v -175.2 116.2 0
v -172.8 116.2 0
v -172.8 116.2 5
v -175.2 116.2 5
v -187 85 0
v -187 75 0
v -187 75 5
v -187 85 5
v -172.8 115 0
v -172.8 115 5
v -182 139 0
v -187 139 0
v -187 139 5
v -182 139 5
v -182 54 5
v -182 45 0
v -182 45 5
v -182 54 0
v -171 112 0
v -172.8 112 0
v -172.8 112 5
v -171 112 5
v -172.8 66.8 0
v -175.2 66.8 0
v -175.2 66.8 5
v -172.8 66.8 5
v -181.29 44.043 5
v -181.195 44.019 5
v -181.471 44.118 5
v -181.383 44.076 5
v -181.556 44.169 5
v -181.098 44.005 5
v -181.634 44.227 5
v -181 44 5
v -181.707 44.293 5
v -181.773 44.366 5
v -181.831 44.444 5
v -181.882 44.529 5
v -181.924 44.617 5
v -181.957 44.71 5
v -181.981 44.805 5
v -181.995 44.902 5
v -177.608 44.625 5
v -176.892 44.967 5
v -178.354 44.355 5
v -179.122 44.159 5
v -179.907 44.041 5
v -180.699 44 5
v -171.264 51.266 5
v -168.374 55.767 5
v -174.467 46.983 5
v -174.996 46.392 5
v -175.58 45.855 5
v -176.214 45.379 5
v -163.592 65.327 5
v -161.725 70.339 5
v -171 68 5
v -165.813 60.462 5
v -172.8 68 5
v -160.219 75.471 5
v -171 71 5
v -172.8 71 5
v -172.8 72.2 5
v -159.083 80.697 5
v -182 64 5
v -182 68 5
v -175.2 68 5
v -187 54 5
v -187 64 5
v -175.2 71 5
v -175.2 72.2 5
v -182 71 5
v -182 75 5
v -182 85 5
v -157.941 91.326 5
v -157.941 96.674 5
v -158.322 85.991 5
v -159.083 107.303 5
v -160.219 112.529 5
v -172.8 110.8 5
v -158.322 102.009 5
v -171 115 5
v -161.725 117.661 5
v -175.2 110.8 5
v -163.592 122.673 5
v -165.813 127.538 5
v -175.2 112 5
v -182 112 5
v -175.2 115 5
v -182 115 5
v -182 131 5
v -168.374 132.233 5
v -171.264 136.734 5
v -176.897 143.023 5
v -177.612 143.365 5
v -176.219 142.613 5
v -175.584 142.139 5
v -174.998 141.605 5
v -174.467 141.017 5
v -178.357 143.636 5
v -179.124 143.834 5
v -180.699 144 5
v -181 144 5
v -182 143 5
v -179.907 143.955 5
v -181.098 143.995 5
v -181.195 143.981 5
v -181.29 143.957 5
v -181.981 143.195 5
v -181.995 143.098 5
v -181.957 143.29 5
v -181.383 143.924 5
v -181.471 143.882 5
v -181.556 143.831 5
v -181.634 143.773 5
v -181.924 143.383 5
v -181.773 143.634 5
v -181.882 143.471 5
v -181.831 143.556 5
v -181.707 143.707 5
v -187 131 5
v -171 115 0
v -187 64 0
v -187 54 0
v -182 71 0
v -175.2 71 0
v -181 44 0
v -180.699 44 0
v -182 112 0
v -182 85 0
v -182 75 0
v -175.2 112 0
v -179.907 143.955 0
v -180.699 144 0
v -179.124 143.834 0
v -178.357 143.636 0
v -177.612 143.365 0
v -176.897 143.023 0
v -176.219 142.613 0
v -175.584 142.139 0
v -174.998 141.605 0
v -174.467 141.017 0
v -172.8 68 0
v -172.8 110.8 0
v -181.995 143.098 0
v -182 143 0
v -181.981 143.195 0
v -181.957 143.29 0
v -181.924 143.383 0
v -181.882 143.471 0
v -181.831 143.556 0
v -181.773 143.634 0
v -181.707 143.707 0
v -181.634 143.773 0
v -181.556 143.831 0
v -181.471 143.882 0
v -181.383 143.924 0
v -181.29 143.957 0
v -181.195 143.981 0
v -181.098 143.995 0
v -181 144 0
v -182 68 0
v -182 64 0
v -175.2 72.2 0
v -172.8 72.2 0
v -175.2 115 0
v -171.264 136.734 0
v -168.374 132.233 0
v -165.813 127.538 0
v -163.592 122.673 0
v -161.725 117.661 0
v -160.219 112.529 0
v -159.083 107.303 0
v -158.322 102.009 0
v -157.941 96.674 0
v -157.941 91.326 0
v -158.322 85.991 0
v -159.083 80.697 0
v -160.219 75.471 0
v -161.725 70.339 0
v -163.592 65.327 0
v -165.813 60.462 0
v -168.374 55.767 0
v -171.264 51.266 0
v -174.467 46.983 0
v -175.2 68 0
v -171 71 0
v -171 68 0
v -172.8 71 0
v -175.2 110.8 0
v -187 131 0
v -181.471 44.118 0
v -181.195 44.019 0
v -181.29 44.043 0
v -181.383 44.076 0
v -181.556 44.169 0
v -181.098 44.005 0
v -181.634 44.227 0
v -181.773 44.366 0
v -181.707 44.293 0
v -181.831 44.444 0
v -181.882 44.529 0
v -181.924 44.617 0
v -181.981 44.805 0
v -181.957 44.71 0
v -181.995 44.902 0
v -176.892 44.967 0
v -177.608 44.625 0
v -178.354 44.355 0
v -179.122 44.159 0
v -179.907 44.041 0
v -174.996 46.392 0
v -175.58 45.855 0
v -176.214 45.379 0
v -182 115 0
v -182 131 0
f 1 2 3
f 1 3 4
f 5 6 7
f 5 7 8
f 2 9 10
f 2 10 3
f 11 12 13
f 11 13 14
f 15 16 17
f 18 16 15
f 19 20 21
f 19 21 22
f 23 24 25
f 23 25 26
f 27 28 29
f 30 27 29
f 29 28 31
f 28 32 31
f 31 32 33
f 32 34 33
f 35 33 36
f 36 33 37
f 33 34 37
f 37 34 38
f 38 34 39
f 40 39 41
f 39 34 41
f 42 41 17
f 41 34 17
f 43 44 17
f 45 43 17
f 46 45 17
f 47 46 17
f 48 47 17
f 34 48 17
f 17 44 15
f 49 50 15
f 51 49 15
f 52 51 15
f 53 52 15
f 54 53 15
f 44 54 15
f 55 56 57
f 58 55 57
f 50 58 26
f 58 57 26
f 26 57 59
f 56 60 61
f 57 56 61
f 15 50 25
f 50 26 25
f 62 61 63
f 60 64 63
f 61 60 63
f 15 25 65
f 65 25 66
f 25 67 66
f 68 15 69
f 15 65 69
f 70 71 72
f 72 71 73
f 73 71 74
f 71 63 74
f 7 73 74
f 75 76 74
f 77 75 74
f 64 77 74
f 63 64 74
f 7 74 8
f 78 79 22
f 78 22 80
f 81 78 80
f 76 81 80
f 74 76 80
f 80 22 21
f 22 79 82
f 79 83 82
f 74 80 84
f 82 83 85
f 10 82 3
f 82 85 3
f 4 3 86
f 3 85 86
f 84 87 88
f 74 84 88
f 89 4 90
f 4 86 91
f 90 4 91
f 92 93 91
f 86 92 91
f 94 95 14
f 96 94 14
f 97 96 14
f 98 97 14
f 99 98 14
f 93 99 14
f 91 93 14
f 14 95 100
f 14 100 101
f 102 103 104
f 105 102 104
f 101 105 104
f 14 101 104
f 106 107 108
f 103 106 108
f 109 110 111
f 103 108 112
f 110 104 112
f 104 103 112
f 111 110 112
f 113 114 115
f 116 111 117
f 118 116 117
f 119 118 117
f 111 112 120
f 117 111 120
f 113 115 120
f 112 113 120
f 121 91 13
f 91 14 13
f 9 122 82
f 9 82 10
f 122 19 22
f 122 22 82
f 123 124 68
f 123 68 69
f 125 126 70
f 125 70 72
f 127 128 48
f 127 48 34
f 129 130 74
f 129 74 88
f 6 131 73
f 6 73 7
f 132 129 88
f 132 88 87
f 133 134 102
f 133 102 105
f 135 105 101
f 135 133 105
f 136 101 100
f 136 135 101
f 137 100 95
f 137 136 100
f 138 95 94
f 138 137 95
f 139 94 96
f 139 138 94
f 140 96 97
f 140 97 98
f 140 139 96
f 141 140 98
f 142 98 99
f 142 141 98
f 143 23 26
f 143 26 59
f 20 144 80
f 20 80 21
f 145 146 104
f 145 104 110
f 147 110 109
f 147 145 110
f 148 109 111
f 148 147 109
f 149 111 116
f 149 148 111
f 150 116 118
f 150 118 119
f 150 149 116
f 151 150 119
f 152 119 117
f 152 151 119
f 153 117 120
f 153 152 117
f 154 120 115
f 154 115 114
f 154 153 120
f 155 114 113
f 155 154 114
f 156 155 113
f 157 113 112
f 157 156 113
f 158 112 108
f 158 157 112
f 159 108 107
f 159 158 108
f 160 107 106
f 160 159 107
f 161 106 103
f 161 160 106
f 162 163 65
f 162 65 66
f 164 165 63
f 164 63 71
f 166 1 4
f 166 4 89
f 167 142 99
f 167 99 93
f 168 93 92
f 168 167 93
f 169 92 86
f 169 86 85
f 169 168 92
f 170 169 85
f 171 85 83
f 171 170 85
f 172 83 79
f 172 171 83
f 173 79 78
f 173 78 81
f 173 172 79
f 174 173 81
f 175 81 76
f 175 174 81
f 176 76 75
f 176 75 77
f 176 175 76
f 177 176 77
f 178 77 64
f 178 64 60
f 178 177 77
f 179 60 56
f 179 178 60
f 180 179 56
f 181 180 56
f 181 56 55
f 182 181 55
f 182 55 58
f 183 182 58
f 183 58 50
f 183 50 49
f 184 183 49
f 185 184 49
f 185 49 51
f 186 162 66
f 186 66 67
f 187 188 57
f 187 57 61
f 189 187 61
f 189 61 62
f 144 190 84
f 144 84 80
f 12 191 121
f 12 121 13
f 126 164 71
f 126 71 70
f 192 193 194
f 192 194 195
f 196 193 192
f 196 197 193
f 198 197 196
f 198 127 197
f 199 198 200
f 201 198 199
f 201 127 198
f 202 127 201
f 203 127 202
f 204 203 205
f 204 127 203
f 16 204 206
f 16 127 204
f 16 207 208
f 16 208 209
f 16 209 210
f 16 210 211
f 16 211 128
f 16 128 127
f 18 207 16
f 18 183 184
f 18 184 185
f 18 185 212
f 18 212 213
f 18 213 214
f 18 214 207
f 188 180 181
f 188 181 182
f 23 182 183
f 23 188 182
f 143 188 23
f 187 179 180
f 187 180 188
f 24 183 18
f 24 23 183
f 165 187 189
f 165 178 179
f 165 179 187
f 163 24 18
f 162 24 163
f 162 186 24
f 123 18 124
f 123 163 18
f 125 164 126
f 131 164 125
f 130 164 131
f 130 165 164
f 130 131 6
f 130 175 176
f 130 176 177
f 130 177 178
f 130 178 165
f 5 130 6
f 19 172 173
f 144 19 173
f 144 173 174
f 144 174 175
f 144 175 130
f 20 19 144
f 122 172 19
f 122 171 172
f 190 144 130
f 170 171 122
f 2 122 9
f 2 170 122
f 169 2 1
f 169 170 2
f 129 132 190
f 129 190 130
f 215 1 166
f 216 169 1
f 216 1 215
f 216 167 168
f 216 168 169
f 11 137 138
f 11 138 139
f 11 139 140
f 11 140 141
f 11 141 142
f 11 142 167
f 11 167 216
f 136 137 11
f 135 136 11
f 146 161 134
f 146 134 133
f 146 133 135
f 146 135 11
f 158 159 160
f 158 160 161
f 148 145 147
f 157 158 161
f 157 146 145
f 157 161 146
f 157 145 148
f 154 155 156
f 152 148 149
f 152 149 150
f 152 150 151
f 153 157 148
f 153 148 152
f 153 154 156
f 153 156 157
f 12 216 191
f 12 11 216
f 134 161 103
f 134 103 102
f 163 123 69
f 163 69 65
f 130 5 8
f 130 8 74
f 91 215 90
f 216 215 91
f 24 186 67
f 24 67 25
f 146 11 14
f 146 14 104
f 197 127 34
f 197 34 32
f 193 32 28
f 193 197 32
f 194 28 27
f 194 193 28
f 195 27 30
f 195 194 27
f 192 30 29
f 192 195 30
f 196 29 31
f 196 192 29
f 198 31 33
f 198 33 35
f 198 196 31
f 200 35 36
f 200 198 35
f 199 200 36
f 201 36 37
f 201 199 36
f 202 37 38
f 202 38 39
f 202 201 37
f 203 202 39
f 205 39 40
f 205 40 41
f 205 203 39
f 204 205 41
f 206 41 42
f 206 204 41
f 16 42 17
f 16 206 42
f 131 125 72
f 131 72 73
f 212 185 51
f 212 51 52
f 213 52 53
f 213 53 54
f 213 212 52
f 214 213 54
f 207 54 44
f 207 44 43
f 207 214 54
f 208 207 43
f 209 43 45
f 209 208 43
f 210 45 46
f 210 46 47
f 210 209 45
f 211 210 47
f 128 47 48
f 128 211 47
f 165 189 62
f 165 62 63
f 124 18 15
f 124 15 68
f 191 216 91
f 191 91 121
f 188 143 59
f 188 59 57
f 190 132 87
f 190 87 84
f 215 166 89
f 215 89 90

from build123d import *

# Parameters (mm, degrees)
RESSALTO_EXTRUS_O1_DEPTH = 5


with BuildPart() as part:
    # Model → Ressalto-extrusão1 (new body)
    with BuildSketch(Plane.XY):
        with BuildLine():
            Line((-182.000002727, 45.000001207), (-182.000002727, 54.000000805))
            Line((-182.000002727, 54.000000805), (-187.000002816, 54.000000805))
            Line((-187.000002816, 54.000000805), (-187.000002816, 64.000000954))
            Line((-187.000002816, 64.000000954), (-182.000002727, 64.000000954))
            Line((-182.000002727, 64.000000954), (-182.000002727, 68.000001045))
            Line((-182.000002727, 68.000001045), (-175.200002727, 68.000001045))
            Line((-175.200002727, 68.000001045), (-175.200002727, 66.800001045))
            Line((-175.200002727, 66.800001045), (-172.800002727, 66.800001045))
            Line((-172.800002727, 66.800001045), (-172.800002727, 68.000001045))
            Line((-172.800002727, 68.000001045), (-171.000002727, 68.000001045))
            Line((-171.000002727, 68.000001045), (-171.000002727, 71.000001026))
            Line((-171.000002727, 71.000001026), (-172.800002727, 71.000001026))
            Line((-172.800002727, 71.000001026), (-172.800002727, 72.200001026))
            Line((-172.800002727, 72.200001026), (-175.200002727, 72.200001026))
            Line((-175.200002727, 72.200001026), (-175.200002727, 71.000001026))
            Line((-175.200002727, 71.000001026), (-182.000002727, 71.000001026))
            Line((-182.000002727, 71.000001026), (-182.000002727, 75.000001118))
            Line((-182.000002727, 75.000001118), (-187.000002816, 75.000001118))
            Line((-187.000002816, 75.000001118), (-187.000002816, 85.000001267))
            Line((-187.000002816, 85.000001267), (-182.000002727, 85.000001267))
            Line((-182.000002727, 85.000001267), (-182.000002727, 112.000001058))
            Line((-182.000002727, 112.000001058), (-175.200002727, 112.000001058))
            Line((-175.200002727, 112.000001058), (-175.200002727, 110.800001058))
            Line((-175.200002727, 110.800001058), (-172.800002727, 110.800001058))
            Line((-172.800002727, 110.800001058), (-172.800002727, 112.000001058))
            Line((-172.800002727, 112.000001058), (-171.000002727, 112.000001058))
            Line((-171.000002727, 112.000001058), (-171.000002727, 115.00000104))
            Line((-171.000002727, 115.00000104), (-172.800002727, 115.00000104))
            Line((-172.800002727, 115.00000104), (-172.800002727, 116.20000104))
            Line((-172.800002727, 116.20000104), (-175.200002727, 116.20000104))
            Line((-175.200002727, 116.20000104), (-175.200002727, 115.00000104))
            Line((-175.200002727, 115.00000104), (-182.000002727, 115.00000104))
            Line((-182.000002727, 115.00000104), (-182.000002727, 131.000001952))
            Line((-182.000002727, 131.000001952), (-187.000002816, 131.000001952))
            Line((-187.000002816, 131.000001952), (-187.000002816, 139.000002071))
            Line((-187.000002816, 139.000002071), (-182.000002727, 139.000002071))
            Line((-182.000002727, 139.000002071), (-182.000002727, 143.000002162))
            ThreePointArc((-182.000002727, 143.000002162), (-181.707109508, 143.707108943), (-181.000002727, 144.000002162))
            Line((-181.000002727, 144.000002162), (-180.698724383, 144.000002162))
            ThreePointArc((-180.698724383, 144.000002162), (-177.250425834, 143.20301546), (-174.467200153, 141.016784571))
            ThreePointArc((-174.467200153, 141.016784571), (-157.893266413, 94.000001418), (-174.467200151, 46.983218264))
            ThreePointArc((-174.467200151, 46.983218264), (-177.245806987, 44.787339393), (-180.698724383, 44.000001207))
            Line((-180.698724383, 44.000001207), (-181.000002727, 44.000001207))
            ThreePointArc((-181.000002727, 44.000001207), (-181.707109508, 44.292894425), (-182.000002727, 45.000001207))
        make_face()
    extrude(amount=RESSALTO_EXTRUS_O1_DEPTH)


solid = part.part
